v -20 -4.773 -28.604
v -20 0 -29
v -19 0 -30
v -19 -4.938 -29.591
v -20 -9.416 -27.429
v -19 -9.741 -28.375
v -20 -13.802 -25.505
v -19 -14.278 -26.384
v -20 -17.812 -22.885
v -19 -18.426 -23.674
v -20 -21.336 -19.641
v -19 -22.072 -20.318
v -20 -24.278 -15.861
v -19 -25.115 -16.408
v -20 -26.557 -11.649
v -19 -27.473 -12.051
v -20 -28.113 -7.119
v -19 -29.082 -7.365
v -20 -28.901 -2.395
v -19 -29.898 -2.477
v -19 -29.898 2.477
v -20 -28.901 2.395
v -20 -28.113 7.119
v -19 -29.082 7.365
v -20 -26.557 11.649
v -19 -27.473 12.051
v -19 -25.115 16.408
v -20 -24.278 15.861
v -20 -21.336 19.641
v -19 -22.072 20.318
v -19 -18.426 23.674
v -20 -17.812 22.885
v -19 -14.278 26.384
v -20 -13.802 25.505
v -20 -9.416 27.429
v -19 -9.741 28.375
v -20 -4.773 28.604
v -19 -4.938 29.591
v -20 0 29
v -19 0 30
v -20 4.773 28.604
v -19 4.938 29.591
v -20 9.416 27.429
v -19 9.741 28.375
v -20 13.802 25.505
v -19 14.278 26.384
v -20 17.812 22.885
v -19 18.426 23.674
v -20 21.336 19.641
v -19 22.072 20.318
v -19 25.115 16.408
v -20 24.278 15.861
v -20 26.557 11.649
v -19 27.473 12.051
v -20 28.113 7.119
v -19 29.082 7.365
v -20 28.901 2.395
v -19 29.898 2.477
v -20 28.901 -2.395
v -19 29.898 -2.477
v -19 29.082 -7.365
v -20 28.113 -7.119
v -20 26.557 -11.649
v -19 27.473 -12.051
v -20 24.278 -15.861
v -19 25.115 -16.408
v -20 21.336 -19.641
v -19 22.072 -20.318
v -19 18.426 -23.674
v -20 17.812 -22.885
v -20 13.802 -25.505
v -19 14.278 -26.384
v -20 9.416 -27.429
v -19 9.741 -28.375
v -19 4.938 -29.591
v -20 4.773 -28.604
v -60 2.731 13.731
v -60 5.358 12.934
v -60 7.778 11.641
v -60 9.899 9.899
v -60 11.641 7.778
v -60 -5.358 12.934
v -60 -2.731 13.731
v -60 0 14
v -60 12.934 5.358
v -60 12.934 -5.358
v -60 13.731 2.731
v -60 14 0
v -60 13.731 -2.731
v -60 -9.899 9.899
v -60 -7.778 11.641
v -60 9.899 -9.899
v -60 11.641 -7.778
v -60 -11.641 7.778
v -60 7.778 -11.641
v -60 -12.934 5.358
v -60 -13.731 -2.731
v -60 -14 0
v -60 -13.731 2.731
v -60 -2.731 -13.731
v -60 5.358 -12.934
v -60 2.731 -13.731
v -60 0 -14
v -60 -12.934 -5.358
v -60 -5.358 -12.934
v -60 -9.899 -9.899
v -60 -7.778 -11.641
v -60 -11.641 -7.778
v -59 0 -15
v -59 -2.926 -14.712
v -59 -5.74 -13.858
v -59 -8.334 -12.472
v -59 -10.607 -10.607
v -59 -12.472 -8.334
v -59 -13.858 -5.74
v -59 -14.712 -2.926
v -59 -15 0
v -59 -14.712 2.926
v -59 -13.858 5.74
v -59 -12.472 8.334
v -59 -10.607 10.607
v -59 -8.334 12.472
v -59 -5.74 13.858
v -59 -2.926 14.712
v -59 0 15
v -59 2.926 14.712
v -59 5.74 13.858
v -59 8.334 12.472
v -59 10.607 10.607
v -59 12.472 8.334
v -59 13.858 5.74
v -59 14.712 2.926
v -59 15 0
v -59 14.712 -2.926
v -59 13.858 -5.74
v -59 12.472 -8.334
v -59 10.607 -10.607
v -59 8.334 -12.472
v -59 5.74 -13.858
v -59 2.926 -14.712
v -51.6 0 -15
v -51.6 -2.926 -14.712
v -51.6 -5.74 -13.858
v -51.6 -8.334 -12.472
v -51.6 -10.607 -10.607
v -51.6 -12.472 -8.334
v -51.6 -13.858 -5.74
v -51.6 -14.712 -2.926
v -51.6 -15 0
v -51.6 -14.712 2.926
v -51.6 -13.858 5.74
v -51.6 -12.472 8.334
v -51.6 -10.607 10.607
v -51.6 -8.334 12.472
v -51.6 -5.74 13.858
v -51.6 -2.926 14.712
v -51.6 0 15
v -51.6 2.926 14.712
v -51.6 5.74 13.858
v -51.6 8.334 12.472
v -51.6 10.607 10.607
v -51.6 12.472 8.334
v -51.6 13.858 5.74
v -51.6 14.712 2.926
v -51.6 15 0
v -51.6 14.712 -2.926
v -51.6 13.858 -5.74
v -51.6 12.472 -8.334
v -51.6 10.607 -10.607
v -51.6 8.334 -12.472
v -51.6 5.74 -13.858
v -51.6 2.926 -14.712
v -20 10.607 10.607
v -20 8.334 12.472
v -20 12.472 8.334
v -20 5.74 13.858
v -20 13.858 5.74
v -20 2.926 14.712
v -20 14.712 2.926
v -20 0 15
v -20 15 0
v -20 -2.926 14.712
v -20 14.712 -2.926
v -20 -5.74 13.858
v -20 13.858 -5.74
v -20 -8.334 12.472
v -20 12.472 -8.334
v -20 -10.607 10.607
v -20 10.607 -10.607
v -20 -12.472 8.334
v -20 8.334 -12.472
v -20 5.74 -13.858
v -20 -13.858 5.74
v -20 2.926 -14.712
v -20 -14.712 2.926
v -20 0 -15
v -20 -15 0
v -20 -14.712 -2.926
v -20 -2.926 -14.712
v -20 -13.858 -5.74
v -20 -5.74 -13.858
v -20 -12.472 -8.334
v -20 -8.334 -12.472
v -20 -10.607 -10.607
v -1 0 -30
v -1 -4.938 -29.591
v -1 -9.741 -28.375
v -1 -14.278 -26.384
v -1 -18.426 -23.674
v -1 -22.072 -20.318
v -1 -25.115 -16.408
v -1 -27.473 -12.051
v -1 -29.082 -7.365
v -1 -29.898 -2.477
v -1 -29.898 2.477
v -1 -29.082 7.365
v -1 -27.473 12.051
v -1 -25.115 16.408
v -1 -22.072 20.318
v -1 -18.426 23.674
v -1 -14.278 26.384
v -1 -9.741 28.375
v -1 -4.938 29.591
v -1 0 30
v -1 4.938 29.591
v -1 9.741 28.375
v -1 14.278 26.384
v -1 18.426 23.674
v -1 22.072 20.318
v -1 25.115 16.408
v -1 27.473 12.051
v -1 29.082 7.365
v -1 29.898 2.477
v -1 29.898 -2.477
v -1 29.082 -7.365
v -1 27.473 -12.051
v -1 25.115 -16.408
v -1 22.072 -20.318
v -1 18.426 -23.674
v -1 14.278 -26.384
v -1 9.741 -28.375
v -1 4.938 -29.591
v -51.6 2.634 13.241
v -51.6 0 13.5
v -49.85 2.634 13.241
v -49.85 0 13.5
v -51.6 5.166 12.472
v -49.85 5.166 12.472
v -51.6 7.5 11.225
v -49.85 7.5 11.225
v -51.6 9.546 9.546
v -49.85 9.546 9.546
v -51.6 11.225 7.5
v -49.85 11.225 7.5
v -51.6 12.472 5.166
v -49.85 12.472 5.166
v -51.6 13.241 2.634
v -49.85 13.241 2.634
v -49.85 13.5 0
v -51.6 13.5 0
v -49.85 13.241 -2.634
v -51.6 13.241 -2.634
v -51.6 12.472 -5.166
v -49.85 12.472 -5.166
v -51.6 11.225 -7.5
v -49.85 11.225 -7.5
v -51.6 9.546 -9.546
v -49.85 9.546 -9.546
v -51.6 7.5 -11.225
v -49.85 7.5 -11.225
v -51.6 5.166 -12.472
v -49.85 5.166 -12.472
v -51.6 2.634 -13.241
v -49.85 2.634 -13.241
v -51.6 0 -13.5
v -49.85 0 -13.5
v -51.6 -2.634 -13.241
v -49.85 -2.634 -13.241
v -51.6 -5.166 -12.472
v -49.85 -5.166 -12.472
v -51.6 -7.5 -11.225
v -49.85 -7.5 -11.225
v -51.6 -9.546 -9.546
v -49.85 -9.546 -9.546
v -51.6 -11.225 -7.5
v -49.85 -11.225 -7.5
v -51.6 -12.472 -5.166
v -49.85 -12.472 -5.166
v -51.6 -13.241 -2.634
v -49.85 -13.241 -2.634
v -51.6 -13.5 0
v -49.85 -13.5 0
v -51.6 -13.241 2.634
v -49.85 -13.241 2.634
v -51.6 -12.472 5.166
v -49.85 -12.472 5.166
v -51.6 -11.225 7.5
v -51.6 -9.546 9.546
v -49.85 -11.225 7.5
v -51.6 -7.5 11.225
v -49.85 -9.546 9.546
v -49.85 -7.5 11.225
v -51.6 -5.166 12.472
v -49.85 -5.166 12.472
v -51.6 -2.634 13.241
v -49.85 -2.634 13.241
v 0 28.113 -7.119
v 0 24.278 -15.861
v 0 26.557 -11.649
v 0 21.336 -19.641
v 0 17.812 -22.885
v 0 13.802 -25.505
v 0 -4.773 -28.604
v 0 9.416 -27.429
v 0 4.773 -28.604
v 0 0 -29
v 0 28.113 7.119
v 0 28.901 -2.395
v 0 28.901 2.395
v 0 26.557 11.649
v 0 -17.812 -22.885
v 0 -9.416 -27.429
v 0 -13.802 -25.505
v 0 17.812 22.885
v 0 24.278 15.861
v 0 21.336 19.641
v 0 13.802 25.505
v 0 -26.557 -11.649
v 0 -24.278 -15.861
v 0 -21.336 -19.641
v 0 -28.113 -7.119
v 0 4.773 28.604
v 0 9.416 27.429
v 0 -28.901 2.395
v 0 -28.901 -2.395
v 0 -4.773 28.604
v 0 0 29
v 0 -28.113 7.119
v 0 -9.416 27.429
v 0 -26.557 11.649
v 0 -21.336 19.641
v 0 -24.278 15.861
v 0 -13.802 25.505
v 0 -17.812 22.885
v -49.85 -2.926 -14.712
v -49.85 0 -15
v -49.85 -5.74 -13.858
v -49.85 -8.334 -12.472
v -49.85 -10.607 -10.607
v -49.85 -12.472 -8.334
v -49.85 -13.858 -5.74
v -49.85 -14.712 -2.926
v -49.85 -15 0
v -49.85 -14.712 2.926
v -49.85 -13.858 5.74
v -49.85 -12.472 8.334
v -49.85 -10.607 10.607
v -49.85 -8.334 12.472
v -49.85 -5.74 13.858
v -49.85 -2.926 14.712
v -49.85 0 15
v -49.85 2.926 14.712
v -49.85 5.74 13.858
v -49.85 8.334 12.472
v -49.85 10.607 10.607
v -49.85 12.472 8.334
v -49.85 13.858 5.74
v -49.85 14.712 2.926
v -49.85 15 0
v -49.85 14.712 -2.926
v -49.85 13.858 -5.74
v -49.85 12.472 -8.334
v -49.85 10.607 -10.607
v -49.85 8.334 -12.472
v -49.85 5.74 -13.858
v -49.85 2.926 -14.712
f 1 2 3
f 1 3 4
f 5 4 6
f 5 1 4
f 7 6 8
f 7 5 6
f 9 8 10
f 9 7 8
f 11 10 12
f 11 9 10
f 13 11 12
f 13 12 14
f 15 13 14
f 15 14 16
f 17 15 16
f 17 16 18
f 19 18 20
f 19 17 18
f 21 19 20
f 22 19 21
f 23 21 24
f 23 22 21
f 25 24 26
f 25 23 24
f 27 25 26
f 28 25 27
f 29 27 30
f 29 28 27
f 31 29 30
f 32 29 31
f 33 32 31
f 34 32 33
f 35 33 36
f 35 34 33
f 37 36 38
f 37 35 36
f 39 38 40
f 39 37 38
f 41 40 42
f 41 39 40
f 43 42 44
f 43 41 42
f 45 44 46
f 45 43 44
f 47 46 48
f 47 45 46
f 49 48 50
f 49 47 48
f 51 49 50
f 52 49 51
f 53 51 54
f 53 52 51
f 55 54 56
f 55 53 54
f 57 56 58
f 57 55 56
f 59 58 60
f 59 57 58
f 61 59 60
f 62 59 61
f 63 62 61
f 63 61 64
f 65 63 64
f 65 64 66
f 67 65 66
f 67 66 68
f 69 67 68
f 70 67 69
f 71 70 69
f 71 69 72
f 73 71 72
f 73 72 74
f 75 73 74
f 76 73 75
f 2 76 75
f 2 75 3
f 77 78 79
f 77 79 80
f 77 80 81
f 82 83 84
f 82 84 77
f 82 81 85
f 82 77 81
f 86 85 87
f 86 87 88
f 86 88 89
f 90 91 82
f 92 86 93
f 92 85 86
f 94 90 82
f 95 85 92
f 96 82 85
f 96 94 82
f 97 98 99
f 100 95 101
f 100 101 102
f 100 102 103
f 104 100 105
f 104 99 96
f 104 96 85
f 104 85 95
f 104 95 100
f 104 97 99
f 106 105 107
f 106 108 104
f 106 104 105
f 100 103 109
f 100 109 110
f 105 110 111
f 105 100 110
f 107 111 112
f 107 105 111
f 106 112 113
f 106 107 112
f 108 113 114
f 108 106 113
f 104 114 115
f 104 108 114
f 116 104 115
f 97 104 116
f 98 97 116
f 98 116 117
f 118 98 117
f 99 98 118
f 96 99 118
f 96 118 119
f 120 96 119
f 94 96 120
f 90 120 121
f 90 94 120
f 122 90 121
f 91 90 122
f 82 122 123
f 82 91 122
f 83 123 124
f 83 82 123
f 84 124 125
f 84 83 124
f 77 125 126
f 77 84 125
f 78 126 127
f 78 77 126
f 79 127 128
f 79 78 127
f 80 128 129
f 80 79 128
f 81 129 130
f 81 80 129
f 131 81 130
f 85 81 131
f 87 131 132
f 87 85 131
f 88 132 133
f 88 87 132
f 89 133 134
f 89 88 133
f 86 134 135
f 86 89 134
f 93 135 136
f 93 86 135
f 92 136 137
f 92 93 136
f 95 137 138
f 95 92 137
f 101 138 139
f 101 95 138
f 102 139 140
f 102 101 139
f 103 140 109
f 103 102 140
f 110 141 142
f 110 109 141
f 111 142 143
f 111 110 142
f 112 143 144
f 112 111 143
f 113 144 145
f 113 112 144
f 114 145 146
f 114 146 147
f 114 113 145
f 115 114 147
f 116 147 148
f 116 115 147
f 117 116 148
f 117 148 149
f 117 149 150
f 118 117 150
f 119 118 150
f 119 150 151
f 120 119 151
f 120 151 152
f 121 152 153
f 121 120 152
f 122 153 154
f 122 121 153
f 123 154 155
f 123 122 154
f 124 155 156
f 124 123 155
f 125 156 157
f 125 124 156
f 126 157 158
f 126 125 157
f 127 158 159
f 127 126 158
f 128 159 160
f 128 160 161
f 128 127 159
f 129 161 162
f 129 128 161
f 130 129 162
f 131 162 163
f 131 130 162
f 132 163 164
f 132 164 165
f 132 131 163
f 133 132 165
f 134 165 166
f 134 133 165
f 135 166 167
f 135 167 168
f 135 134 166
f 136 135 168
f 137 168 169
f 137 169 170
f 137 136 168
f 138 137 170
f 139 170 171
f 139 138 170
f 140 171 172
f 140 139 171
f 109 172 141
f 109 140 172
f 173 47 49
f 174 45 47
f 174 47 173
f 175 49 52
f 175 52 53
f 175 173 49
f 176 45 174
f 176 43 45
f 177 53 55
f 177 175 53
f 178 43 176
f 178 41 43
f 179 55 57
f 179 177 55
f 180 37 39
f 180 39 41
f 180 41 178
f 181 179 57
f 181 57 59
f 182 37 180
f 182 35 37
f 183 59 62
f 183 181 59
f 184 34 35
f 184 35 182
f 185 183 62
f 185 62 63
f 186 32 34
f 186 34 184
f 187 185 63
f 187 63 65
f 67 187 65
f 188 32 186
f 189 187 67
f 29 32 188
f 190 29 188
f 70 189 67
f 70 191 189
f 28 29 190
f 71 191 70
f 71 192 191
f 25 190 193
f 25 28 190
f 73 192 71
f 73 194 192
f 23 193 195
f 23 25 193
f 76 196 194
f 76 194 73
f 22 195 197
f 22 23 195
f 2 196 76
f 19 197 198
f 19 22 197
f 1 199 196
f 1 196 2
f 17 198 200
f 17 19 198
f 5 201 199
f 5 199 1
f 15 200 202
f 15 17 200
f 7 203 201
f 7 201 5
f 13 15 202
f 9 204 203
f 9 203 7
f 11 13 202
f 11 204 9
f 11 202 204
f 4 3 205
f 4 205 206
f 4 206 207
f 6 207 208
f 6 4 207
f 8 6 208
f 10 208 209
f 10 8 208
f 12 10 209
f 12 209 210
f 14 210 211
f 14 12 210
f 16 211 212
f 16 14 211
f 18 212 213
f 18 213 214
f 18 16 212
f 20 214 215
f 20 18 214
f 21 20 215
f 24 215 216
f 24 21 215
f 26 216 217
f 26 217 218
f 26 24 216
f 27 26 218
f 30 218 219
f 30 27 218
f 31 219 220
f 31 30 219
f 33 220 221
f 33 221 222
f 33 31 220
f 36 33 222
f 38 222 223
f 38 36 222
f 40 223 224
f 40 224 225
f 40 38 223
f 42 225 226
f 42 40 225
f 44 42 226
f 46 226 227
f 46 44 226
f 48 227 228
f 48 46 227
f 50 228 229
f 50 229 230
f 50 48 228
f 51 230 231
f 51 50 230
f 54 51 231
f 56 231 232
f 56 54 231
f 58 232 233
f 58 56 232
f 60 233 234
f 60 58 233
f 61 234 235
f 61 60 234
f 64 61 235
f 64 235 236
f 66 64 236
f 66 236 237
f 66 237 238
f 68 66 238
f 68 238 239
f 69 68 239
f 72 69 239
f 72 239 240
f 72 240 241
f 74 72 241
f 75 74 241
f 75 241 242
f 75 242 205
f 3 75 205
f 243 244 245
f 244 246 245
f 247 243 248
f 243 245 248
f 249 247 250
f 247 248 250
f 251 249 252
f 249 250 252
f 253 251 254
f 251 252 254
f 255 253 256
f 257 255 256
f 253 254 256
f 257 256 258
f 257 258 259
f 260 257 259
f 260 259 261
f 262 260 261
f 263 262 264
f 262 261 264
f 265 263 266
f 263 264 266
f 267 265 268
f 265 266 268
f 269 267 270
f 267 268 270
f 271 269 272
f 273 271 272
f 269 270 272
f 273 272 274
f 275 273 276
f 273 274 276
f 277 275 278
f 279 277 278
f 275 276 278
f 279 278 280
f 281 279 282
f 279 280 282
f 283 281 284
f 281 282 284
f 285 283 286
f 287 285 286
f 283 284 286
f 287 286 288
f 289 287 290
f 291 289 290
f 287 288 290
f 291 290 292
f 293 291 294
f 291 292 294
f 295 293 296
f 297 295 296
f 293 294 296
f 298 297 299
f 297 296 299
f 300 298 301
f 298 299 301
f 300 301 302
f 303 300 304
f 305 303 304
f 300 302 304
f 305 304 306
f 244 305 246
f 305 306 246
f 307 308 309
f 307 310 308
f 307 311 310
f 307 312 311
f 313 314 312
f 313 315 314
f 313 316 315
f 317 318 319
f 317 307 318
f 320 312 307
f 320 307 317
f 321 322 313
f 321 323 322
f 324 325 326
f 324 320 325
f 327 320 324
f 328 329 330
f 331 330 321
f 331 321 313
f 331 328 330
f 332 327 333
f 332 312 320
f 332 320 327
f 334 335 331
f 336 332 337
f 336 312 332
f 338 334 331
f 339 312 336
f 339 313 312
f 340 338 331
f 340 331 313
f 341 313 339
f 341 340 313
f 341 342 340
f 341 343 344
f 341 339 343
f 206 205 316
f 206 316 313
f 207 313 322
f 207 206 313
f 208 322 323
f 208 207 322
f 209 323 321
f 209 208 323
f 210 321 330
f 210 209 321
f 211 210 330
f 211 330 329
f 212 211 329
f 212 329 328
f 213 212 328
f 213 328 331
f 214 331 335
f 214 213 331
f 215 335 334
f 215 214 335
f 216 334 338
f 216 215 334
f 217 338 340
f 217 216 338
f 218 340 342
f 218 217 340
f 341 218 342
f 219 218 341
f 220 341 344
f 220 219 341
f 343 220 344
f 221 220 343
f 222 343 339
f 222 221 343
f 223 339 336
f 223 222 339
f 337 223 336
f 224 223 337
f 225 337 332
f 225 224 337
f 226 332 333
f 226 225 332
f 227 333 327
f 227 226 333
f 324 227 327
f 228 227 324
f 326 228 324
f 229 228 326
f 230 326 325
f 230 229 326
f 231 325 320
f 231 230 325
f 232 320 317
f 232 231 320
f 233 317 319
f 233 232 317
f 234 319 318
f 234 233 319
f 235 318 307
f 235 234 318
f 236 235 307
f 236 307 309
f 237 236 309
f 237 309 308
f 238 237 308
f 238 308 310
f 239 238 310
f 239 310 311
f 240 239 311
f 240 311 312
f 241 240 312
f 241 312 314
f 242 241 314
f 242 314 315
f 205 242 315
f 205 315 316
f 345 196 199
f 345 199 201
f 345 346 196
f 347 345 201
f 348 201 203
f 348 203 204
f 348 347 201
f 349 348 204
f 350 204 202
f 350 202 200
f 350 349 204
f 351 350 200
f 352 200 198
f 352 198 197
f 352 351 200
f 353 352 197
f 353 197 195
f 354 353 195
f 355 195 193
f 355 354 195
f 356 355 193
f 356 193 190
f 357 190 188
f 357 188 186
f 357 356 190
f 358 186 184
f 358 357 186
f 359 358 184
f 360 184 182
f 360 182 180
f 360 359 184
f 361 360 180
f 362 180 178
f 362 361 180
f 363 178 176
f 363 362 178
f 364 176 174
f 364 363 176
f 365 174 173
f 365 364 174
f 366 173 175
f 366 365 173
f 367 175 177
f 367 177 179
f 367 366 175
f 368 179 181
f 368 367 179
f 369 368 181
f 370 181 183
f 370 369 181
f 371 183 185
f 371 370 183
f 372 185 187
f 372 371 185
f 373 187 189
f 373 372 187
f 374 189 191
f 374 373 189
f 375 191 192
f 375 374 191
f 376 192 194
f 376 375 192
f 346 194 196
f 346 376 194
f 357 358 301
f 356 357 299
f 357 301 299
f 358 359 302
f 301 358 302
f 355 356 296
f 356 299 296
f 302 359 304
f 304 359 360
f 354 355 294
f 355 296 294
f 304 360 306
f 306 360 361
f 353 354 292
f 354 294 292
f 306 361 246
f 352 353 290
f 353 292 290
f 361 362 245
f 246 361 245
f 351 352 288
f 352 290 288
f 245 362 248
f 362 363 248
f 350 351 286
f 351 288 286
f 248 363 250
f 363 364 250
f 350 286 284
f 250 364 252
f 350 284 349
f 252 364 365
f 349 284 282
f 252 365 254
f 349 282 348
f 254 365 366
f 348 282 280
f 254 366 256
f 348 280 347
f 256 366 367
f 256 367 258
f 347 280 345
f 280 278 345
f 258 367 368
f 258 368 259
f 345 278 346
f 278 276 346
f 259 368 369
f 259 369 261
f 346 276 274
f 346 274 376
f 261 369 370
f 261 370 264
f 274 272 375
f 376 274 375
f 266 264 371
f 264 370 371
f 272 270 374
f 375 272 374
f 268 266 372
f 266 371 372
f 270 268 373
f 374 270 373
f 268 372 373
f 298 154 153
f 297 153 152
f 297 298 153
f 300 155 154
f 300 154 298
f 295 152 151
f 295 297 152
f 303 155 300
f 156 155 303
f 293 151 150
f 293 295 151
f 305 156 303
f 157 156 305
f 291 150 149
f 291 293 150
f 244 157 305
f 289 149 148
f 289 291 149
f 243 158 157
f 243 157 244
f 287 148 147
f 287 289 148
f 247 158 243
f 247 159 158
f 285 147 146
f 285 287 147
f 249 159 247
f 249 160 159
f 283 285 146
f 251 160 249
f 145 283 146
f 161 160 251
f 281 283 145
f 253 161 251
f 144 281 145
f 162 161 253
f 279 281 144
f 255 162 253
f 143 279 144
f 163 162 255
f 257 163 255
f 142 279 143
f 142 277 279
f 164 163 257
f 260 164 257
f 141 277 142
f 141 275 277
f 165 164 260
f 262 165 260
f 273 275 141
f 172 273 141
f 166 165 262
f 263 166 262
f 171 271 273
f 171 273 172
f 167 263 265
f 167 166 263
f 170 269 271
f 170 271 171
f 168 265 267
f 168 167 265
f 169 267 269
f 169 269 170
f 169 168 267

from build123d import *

# Parameters (mm, degrees)
SMUSSO1_SIZE = 1
SCHIZZO5_W   = 1.6
SCHIZZO5_H   = 4.170885387
SCHIZZO5_W_2 = 0.15


with BuildPart() as part:
    # Schizzo1 → Rivoluzione1 (revolve)
    with BuildSketch(Plane.XY, mode=Mode.PRIVATE) as rivoluzione1_sk:
        Polygon((0, 0), (0, 30), (-20, 30), (-20, 15), (-60, 15), (-60, 0), align=None)
    revolve(rivoluzione1_sk.sketch.rotate(Axis((0, 0, 0), (-1, 0, 0)), 90), axis=Axis((0, 0, 0), (-1, 0, 0)))

    # Smusso1
    smusso1_edges = [part.edges().sort_by_distance(p)[0] for p in [
        (-60, 0, 15),
        (-20, 0, 30),
        (0, 0, 30),
    ]]
    chamfer(smusso1_edges, length=SMUSSO1_SIZE)

    # Schizzo5 → Taglia-Rivoluzione7 (revolve, cut)
    with BuildSketch(Plane.XY, mode=Mode.PRIVATE) as taglia_rivoluzione7_sk:
        with Locations((-50.8, 15.585442694)):
            Rectangle(SCHIZZO5_W, SCHIZZO5_H)
        with Locations((-49.925, 15.585442694)):
            Rectangle(SCHIZZO5_W_2, SCHIZZO5_H)
    revolve(taglia_rivoluzione7_sk.sketch.rotate(Axis((0, 0, 0), (-1, 0, 0)), 270), axis=Axis((0, 0, 0), (-1, 0, 0)), mode=Mode.SUBTRACT)


solid = part.part
